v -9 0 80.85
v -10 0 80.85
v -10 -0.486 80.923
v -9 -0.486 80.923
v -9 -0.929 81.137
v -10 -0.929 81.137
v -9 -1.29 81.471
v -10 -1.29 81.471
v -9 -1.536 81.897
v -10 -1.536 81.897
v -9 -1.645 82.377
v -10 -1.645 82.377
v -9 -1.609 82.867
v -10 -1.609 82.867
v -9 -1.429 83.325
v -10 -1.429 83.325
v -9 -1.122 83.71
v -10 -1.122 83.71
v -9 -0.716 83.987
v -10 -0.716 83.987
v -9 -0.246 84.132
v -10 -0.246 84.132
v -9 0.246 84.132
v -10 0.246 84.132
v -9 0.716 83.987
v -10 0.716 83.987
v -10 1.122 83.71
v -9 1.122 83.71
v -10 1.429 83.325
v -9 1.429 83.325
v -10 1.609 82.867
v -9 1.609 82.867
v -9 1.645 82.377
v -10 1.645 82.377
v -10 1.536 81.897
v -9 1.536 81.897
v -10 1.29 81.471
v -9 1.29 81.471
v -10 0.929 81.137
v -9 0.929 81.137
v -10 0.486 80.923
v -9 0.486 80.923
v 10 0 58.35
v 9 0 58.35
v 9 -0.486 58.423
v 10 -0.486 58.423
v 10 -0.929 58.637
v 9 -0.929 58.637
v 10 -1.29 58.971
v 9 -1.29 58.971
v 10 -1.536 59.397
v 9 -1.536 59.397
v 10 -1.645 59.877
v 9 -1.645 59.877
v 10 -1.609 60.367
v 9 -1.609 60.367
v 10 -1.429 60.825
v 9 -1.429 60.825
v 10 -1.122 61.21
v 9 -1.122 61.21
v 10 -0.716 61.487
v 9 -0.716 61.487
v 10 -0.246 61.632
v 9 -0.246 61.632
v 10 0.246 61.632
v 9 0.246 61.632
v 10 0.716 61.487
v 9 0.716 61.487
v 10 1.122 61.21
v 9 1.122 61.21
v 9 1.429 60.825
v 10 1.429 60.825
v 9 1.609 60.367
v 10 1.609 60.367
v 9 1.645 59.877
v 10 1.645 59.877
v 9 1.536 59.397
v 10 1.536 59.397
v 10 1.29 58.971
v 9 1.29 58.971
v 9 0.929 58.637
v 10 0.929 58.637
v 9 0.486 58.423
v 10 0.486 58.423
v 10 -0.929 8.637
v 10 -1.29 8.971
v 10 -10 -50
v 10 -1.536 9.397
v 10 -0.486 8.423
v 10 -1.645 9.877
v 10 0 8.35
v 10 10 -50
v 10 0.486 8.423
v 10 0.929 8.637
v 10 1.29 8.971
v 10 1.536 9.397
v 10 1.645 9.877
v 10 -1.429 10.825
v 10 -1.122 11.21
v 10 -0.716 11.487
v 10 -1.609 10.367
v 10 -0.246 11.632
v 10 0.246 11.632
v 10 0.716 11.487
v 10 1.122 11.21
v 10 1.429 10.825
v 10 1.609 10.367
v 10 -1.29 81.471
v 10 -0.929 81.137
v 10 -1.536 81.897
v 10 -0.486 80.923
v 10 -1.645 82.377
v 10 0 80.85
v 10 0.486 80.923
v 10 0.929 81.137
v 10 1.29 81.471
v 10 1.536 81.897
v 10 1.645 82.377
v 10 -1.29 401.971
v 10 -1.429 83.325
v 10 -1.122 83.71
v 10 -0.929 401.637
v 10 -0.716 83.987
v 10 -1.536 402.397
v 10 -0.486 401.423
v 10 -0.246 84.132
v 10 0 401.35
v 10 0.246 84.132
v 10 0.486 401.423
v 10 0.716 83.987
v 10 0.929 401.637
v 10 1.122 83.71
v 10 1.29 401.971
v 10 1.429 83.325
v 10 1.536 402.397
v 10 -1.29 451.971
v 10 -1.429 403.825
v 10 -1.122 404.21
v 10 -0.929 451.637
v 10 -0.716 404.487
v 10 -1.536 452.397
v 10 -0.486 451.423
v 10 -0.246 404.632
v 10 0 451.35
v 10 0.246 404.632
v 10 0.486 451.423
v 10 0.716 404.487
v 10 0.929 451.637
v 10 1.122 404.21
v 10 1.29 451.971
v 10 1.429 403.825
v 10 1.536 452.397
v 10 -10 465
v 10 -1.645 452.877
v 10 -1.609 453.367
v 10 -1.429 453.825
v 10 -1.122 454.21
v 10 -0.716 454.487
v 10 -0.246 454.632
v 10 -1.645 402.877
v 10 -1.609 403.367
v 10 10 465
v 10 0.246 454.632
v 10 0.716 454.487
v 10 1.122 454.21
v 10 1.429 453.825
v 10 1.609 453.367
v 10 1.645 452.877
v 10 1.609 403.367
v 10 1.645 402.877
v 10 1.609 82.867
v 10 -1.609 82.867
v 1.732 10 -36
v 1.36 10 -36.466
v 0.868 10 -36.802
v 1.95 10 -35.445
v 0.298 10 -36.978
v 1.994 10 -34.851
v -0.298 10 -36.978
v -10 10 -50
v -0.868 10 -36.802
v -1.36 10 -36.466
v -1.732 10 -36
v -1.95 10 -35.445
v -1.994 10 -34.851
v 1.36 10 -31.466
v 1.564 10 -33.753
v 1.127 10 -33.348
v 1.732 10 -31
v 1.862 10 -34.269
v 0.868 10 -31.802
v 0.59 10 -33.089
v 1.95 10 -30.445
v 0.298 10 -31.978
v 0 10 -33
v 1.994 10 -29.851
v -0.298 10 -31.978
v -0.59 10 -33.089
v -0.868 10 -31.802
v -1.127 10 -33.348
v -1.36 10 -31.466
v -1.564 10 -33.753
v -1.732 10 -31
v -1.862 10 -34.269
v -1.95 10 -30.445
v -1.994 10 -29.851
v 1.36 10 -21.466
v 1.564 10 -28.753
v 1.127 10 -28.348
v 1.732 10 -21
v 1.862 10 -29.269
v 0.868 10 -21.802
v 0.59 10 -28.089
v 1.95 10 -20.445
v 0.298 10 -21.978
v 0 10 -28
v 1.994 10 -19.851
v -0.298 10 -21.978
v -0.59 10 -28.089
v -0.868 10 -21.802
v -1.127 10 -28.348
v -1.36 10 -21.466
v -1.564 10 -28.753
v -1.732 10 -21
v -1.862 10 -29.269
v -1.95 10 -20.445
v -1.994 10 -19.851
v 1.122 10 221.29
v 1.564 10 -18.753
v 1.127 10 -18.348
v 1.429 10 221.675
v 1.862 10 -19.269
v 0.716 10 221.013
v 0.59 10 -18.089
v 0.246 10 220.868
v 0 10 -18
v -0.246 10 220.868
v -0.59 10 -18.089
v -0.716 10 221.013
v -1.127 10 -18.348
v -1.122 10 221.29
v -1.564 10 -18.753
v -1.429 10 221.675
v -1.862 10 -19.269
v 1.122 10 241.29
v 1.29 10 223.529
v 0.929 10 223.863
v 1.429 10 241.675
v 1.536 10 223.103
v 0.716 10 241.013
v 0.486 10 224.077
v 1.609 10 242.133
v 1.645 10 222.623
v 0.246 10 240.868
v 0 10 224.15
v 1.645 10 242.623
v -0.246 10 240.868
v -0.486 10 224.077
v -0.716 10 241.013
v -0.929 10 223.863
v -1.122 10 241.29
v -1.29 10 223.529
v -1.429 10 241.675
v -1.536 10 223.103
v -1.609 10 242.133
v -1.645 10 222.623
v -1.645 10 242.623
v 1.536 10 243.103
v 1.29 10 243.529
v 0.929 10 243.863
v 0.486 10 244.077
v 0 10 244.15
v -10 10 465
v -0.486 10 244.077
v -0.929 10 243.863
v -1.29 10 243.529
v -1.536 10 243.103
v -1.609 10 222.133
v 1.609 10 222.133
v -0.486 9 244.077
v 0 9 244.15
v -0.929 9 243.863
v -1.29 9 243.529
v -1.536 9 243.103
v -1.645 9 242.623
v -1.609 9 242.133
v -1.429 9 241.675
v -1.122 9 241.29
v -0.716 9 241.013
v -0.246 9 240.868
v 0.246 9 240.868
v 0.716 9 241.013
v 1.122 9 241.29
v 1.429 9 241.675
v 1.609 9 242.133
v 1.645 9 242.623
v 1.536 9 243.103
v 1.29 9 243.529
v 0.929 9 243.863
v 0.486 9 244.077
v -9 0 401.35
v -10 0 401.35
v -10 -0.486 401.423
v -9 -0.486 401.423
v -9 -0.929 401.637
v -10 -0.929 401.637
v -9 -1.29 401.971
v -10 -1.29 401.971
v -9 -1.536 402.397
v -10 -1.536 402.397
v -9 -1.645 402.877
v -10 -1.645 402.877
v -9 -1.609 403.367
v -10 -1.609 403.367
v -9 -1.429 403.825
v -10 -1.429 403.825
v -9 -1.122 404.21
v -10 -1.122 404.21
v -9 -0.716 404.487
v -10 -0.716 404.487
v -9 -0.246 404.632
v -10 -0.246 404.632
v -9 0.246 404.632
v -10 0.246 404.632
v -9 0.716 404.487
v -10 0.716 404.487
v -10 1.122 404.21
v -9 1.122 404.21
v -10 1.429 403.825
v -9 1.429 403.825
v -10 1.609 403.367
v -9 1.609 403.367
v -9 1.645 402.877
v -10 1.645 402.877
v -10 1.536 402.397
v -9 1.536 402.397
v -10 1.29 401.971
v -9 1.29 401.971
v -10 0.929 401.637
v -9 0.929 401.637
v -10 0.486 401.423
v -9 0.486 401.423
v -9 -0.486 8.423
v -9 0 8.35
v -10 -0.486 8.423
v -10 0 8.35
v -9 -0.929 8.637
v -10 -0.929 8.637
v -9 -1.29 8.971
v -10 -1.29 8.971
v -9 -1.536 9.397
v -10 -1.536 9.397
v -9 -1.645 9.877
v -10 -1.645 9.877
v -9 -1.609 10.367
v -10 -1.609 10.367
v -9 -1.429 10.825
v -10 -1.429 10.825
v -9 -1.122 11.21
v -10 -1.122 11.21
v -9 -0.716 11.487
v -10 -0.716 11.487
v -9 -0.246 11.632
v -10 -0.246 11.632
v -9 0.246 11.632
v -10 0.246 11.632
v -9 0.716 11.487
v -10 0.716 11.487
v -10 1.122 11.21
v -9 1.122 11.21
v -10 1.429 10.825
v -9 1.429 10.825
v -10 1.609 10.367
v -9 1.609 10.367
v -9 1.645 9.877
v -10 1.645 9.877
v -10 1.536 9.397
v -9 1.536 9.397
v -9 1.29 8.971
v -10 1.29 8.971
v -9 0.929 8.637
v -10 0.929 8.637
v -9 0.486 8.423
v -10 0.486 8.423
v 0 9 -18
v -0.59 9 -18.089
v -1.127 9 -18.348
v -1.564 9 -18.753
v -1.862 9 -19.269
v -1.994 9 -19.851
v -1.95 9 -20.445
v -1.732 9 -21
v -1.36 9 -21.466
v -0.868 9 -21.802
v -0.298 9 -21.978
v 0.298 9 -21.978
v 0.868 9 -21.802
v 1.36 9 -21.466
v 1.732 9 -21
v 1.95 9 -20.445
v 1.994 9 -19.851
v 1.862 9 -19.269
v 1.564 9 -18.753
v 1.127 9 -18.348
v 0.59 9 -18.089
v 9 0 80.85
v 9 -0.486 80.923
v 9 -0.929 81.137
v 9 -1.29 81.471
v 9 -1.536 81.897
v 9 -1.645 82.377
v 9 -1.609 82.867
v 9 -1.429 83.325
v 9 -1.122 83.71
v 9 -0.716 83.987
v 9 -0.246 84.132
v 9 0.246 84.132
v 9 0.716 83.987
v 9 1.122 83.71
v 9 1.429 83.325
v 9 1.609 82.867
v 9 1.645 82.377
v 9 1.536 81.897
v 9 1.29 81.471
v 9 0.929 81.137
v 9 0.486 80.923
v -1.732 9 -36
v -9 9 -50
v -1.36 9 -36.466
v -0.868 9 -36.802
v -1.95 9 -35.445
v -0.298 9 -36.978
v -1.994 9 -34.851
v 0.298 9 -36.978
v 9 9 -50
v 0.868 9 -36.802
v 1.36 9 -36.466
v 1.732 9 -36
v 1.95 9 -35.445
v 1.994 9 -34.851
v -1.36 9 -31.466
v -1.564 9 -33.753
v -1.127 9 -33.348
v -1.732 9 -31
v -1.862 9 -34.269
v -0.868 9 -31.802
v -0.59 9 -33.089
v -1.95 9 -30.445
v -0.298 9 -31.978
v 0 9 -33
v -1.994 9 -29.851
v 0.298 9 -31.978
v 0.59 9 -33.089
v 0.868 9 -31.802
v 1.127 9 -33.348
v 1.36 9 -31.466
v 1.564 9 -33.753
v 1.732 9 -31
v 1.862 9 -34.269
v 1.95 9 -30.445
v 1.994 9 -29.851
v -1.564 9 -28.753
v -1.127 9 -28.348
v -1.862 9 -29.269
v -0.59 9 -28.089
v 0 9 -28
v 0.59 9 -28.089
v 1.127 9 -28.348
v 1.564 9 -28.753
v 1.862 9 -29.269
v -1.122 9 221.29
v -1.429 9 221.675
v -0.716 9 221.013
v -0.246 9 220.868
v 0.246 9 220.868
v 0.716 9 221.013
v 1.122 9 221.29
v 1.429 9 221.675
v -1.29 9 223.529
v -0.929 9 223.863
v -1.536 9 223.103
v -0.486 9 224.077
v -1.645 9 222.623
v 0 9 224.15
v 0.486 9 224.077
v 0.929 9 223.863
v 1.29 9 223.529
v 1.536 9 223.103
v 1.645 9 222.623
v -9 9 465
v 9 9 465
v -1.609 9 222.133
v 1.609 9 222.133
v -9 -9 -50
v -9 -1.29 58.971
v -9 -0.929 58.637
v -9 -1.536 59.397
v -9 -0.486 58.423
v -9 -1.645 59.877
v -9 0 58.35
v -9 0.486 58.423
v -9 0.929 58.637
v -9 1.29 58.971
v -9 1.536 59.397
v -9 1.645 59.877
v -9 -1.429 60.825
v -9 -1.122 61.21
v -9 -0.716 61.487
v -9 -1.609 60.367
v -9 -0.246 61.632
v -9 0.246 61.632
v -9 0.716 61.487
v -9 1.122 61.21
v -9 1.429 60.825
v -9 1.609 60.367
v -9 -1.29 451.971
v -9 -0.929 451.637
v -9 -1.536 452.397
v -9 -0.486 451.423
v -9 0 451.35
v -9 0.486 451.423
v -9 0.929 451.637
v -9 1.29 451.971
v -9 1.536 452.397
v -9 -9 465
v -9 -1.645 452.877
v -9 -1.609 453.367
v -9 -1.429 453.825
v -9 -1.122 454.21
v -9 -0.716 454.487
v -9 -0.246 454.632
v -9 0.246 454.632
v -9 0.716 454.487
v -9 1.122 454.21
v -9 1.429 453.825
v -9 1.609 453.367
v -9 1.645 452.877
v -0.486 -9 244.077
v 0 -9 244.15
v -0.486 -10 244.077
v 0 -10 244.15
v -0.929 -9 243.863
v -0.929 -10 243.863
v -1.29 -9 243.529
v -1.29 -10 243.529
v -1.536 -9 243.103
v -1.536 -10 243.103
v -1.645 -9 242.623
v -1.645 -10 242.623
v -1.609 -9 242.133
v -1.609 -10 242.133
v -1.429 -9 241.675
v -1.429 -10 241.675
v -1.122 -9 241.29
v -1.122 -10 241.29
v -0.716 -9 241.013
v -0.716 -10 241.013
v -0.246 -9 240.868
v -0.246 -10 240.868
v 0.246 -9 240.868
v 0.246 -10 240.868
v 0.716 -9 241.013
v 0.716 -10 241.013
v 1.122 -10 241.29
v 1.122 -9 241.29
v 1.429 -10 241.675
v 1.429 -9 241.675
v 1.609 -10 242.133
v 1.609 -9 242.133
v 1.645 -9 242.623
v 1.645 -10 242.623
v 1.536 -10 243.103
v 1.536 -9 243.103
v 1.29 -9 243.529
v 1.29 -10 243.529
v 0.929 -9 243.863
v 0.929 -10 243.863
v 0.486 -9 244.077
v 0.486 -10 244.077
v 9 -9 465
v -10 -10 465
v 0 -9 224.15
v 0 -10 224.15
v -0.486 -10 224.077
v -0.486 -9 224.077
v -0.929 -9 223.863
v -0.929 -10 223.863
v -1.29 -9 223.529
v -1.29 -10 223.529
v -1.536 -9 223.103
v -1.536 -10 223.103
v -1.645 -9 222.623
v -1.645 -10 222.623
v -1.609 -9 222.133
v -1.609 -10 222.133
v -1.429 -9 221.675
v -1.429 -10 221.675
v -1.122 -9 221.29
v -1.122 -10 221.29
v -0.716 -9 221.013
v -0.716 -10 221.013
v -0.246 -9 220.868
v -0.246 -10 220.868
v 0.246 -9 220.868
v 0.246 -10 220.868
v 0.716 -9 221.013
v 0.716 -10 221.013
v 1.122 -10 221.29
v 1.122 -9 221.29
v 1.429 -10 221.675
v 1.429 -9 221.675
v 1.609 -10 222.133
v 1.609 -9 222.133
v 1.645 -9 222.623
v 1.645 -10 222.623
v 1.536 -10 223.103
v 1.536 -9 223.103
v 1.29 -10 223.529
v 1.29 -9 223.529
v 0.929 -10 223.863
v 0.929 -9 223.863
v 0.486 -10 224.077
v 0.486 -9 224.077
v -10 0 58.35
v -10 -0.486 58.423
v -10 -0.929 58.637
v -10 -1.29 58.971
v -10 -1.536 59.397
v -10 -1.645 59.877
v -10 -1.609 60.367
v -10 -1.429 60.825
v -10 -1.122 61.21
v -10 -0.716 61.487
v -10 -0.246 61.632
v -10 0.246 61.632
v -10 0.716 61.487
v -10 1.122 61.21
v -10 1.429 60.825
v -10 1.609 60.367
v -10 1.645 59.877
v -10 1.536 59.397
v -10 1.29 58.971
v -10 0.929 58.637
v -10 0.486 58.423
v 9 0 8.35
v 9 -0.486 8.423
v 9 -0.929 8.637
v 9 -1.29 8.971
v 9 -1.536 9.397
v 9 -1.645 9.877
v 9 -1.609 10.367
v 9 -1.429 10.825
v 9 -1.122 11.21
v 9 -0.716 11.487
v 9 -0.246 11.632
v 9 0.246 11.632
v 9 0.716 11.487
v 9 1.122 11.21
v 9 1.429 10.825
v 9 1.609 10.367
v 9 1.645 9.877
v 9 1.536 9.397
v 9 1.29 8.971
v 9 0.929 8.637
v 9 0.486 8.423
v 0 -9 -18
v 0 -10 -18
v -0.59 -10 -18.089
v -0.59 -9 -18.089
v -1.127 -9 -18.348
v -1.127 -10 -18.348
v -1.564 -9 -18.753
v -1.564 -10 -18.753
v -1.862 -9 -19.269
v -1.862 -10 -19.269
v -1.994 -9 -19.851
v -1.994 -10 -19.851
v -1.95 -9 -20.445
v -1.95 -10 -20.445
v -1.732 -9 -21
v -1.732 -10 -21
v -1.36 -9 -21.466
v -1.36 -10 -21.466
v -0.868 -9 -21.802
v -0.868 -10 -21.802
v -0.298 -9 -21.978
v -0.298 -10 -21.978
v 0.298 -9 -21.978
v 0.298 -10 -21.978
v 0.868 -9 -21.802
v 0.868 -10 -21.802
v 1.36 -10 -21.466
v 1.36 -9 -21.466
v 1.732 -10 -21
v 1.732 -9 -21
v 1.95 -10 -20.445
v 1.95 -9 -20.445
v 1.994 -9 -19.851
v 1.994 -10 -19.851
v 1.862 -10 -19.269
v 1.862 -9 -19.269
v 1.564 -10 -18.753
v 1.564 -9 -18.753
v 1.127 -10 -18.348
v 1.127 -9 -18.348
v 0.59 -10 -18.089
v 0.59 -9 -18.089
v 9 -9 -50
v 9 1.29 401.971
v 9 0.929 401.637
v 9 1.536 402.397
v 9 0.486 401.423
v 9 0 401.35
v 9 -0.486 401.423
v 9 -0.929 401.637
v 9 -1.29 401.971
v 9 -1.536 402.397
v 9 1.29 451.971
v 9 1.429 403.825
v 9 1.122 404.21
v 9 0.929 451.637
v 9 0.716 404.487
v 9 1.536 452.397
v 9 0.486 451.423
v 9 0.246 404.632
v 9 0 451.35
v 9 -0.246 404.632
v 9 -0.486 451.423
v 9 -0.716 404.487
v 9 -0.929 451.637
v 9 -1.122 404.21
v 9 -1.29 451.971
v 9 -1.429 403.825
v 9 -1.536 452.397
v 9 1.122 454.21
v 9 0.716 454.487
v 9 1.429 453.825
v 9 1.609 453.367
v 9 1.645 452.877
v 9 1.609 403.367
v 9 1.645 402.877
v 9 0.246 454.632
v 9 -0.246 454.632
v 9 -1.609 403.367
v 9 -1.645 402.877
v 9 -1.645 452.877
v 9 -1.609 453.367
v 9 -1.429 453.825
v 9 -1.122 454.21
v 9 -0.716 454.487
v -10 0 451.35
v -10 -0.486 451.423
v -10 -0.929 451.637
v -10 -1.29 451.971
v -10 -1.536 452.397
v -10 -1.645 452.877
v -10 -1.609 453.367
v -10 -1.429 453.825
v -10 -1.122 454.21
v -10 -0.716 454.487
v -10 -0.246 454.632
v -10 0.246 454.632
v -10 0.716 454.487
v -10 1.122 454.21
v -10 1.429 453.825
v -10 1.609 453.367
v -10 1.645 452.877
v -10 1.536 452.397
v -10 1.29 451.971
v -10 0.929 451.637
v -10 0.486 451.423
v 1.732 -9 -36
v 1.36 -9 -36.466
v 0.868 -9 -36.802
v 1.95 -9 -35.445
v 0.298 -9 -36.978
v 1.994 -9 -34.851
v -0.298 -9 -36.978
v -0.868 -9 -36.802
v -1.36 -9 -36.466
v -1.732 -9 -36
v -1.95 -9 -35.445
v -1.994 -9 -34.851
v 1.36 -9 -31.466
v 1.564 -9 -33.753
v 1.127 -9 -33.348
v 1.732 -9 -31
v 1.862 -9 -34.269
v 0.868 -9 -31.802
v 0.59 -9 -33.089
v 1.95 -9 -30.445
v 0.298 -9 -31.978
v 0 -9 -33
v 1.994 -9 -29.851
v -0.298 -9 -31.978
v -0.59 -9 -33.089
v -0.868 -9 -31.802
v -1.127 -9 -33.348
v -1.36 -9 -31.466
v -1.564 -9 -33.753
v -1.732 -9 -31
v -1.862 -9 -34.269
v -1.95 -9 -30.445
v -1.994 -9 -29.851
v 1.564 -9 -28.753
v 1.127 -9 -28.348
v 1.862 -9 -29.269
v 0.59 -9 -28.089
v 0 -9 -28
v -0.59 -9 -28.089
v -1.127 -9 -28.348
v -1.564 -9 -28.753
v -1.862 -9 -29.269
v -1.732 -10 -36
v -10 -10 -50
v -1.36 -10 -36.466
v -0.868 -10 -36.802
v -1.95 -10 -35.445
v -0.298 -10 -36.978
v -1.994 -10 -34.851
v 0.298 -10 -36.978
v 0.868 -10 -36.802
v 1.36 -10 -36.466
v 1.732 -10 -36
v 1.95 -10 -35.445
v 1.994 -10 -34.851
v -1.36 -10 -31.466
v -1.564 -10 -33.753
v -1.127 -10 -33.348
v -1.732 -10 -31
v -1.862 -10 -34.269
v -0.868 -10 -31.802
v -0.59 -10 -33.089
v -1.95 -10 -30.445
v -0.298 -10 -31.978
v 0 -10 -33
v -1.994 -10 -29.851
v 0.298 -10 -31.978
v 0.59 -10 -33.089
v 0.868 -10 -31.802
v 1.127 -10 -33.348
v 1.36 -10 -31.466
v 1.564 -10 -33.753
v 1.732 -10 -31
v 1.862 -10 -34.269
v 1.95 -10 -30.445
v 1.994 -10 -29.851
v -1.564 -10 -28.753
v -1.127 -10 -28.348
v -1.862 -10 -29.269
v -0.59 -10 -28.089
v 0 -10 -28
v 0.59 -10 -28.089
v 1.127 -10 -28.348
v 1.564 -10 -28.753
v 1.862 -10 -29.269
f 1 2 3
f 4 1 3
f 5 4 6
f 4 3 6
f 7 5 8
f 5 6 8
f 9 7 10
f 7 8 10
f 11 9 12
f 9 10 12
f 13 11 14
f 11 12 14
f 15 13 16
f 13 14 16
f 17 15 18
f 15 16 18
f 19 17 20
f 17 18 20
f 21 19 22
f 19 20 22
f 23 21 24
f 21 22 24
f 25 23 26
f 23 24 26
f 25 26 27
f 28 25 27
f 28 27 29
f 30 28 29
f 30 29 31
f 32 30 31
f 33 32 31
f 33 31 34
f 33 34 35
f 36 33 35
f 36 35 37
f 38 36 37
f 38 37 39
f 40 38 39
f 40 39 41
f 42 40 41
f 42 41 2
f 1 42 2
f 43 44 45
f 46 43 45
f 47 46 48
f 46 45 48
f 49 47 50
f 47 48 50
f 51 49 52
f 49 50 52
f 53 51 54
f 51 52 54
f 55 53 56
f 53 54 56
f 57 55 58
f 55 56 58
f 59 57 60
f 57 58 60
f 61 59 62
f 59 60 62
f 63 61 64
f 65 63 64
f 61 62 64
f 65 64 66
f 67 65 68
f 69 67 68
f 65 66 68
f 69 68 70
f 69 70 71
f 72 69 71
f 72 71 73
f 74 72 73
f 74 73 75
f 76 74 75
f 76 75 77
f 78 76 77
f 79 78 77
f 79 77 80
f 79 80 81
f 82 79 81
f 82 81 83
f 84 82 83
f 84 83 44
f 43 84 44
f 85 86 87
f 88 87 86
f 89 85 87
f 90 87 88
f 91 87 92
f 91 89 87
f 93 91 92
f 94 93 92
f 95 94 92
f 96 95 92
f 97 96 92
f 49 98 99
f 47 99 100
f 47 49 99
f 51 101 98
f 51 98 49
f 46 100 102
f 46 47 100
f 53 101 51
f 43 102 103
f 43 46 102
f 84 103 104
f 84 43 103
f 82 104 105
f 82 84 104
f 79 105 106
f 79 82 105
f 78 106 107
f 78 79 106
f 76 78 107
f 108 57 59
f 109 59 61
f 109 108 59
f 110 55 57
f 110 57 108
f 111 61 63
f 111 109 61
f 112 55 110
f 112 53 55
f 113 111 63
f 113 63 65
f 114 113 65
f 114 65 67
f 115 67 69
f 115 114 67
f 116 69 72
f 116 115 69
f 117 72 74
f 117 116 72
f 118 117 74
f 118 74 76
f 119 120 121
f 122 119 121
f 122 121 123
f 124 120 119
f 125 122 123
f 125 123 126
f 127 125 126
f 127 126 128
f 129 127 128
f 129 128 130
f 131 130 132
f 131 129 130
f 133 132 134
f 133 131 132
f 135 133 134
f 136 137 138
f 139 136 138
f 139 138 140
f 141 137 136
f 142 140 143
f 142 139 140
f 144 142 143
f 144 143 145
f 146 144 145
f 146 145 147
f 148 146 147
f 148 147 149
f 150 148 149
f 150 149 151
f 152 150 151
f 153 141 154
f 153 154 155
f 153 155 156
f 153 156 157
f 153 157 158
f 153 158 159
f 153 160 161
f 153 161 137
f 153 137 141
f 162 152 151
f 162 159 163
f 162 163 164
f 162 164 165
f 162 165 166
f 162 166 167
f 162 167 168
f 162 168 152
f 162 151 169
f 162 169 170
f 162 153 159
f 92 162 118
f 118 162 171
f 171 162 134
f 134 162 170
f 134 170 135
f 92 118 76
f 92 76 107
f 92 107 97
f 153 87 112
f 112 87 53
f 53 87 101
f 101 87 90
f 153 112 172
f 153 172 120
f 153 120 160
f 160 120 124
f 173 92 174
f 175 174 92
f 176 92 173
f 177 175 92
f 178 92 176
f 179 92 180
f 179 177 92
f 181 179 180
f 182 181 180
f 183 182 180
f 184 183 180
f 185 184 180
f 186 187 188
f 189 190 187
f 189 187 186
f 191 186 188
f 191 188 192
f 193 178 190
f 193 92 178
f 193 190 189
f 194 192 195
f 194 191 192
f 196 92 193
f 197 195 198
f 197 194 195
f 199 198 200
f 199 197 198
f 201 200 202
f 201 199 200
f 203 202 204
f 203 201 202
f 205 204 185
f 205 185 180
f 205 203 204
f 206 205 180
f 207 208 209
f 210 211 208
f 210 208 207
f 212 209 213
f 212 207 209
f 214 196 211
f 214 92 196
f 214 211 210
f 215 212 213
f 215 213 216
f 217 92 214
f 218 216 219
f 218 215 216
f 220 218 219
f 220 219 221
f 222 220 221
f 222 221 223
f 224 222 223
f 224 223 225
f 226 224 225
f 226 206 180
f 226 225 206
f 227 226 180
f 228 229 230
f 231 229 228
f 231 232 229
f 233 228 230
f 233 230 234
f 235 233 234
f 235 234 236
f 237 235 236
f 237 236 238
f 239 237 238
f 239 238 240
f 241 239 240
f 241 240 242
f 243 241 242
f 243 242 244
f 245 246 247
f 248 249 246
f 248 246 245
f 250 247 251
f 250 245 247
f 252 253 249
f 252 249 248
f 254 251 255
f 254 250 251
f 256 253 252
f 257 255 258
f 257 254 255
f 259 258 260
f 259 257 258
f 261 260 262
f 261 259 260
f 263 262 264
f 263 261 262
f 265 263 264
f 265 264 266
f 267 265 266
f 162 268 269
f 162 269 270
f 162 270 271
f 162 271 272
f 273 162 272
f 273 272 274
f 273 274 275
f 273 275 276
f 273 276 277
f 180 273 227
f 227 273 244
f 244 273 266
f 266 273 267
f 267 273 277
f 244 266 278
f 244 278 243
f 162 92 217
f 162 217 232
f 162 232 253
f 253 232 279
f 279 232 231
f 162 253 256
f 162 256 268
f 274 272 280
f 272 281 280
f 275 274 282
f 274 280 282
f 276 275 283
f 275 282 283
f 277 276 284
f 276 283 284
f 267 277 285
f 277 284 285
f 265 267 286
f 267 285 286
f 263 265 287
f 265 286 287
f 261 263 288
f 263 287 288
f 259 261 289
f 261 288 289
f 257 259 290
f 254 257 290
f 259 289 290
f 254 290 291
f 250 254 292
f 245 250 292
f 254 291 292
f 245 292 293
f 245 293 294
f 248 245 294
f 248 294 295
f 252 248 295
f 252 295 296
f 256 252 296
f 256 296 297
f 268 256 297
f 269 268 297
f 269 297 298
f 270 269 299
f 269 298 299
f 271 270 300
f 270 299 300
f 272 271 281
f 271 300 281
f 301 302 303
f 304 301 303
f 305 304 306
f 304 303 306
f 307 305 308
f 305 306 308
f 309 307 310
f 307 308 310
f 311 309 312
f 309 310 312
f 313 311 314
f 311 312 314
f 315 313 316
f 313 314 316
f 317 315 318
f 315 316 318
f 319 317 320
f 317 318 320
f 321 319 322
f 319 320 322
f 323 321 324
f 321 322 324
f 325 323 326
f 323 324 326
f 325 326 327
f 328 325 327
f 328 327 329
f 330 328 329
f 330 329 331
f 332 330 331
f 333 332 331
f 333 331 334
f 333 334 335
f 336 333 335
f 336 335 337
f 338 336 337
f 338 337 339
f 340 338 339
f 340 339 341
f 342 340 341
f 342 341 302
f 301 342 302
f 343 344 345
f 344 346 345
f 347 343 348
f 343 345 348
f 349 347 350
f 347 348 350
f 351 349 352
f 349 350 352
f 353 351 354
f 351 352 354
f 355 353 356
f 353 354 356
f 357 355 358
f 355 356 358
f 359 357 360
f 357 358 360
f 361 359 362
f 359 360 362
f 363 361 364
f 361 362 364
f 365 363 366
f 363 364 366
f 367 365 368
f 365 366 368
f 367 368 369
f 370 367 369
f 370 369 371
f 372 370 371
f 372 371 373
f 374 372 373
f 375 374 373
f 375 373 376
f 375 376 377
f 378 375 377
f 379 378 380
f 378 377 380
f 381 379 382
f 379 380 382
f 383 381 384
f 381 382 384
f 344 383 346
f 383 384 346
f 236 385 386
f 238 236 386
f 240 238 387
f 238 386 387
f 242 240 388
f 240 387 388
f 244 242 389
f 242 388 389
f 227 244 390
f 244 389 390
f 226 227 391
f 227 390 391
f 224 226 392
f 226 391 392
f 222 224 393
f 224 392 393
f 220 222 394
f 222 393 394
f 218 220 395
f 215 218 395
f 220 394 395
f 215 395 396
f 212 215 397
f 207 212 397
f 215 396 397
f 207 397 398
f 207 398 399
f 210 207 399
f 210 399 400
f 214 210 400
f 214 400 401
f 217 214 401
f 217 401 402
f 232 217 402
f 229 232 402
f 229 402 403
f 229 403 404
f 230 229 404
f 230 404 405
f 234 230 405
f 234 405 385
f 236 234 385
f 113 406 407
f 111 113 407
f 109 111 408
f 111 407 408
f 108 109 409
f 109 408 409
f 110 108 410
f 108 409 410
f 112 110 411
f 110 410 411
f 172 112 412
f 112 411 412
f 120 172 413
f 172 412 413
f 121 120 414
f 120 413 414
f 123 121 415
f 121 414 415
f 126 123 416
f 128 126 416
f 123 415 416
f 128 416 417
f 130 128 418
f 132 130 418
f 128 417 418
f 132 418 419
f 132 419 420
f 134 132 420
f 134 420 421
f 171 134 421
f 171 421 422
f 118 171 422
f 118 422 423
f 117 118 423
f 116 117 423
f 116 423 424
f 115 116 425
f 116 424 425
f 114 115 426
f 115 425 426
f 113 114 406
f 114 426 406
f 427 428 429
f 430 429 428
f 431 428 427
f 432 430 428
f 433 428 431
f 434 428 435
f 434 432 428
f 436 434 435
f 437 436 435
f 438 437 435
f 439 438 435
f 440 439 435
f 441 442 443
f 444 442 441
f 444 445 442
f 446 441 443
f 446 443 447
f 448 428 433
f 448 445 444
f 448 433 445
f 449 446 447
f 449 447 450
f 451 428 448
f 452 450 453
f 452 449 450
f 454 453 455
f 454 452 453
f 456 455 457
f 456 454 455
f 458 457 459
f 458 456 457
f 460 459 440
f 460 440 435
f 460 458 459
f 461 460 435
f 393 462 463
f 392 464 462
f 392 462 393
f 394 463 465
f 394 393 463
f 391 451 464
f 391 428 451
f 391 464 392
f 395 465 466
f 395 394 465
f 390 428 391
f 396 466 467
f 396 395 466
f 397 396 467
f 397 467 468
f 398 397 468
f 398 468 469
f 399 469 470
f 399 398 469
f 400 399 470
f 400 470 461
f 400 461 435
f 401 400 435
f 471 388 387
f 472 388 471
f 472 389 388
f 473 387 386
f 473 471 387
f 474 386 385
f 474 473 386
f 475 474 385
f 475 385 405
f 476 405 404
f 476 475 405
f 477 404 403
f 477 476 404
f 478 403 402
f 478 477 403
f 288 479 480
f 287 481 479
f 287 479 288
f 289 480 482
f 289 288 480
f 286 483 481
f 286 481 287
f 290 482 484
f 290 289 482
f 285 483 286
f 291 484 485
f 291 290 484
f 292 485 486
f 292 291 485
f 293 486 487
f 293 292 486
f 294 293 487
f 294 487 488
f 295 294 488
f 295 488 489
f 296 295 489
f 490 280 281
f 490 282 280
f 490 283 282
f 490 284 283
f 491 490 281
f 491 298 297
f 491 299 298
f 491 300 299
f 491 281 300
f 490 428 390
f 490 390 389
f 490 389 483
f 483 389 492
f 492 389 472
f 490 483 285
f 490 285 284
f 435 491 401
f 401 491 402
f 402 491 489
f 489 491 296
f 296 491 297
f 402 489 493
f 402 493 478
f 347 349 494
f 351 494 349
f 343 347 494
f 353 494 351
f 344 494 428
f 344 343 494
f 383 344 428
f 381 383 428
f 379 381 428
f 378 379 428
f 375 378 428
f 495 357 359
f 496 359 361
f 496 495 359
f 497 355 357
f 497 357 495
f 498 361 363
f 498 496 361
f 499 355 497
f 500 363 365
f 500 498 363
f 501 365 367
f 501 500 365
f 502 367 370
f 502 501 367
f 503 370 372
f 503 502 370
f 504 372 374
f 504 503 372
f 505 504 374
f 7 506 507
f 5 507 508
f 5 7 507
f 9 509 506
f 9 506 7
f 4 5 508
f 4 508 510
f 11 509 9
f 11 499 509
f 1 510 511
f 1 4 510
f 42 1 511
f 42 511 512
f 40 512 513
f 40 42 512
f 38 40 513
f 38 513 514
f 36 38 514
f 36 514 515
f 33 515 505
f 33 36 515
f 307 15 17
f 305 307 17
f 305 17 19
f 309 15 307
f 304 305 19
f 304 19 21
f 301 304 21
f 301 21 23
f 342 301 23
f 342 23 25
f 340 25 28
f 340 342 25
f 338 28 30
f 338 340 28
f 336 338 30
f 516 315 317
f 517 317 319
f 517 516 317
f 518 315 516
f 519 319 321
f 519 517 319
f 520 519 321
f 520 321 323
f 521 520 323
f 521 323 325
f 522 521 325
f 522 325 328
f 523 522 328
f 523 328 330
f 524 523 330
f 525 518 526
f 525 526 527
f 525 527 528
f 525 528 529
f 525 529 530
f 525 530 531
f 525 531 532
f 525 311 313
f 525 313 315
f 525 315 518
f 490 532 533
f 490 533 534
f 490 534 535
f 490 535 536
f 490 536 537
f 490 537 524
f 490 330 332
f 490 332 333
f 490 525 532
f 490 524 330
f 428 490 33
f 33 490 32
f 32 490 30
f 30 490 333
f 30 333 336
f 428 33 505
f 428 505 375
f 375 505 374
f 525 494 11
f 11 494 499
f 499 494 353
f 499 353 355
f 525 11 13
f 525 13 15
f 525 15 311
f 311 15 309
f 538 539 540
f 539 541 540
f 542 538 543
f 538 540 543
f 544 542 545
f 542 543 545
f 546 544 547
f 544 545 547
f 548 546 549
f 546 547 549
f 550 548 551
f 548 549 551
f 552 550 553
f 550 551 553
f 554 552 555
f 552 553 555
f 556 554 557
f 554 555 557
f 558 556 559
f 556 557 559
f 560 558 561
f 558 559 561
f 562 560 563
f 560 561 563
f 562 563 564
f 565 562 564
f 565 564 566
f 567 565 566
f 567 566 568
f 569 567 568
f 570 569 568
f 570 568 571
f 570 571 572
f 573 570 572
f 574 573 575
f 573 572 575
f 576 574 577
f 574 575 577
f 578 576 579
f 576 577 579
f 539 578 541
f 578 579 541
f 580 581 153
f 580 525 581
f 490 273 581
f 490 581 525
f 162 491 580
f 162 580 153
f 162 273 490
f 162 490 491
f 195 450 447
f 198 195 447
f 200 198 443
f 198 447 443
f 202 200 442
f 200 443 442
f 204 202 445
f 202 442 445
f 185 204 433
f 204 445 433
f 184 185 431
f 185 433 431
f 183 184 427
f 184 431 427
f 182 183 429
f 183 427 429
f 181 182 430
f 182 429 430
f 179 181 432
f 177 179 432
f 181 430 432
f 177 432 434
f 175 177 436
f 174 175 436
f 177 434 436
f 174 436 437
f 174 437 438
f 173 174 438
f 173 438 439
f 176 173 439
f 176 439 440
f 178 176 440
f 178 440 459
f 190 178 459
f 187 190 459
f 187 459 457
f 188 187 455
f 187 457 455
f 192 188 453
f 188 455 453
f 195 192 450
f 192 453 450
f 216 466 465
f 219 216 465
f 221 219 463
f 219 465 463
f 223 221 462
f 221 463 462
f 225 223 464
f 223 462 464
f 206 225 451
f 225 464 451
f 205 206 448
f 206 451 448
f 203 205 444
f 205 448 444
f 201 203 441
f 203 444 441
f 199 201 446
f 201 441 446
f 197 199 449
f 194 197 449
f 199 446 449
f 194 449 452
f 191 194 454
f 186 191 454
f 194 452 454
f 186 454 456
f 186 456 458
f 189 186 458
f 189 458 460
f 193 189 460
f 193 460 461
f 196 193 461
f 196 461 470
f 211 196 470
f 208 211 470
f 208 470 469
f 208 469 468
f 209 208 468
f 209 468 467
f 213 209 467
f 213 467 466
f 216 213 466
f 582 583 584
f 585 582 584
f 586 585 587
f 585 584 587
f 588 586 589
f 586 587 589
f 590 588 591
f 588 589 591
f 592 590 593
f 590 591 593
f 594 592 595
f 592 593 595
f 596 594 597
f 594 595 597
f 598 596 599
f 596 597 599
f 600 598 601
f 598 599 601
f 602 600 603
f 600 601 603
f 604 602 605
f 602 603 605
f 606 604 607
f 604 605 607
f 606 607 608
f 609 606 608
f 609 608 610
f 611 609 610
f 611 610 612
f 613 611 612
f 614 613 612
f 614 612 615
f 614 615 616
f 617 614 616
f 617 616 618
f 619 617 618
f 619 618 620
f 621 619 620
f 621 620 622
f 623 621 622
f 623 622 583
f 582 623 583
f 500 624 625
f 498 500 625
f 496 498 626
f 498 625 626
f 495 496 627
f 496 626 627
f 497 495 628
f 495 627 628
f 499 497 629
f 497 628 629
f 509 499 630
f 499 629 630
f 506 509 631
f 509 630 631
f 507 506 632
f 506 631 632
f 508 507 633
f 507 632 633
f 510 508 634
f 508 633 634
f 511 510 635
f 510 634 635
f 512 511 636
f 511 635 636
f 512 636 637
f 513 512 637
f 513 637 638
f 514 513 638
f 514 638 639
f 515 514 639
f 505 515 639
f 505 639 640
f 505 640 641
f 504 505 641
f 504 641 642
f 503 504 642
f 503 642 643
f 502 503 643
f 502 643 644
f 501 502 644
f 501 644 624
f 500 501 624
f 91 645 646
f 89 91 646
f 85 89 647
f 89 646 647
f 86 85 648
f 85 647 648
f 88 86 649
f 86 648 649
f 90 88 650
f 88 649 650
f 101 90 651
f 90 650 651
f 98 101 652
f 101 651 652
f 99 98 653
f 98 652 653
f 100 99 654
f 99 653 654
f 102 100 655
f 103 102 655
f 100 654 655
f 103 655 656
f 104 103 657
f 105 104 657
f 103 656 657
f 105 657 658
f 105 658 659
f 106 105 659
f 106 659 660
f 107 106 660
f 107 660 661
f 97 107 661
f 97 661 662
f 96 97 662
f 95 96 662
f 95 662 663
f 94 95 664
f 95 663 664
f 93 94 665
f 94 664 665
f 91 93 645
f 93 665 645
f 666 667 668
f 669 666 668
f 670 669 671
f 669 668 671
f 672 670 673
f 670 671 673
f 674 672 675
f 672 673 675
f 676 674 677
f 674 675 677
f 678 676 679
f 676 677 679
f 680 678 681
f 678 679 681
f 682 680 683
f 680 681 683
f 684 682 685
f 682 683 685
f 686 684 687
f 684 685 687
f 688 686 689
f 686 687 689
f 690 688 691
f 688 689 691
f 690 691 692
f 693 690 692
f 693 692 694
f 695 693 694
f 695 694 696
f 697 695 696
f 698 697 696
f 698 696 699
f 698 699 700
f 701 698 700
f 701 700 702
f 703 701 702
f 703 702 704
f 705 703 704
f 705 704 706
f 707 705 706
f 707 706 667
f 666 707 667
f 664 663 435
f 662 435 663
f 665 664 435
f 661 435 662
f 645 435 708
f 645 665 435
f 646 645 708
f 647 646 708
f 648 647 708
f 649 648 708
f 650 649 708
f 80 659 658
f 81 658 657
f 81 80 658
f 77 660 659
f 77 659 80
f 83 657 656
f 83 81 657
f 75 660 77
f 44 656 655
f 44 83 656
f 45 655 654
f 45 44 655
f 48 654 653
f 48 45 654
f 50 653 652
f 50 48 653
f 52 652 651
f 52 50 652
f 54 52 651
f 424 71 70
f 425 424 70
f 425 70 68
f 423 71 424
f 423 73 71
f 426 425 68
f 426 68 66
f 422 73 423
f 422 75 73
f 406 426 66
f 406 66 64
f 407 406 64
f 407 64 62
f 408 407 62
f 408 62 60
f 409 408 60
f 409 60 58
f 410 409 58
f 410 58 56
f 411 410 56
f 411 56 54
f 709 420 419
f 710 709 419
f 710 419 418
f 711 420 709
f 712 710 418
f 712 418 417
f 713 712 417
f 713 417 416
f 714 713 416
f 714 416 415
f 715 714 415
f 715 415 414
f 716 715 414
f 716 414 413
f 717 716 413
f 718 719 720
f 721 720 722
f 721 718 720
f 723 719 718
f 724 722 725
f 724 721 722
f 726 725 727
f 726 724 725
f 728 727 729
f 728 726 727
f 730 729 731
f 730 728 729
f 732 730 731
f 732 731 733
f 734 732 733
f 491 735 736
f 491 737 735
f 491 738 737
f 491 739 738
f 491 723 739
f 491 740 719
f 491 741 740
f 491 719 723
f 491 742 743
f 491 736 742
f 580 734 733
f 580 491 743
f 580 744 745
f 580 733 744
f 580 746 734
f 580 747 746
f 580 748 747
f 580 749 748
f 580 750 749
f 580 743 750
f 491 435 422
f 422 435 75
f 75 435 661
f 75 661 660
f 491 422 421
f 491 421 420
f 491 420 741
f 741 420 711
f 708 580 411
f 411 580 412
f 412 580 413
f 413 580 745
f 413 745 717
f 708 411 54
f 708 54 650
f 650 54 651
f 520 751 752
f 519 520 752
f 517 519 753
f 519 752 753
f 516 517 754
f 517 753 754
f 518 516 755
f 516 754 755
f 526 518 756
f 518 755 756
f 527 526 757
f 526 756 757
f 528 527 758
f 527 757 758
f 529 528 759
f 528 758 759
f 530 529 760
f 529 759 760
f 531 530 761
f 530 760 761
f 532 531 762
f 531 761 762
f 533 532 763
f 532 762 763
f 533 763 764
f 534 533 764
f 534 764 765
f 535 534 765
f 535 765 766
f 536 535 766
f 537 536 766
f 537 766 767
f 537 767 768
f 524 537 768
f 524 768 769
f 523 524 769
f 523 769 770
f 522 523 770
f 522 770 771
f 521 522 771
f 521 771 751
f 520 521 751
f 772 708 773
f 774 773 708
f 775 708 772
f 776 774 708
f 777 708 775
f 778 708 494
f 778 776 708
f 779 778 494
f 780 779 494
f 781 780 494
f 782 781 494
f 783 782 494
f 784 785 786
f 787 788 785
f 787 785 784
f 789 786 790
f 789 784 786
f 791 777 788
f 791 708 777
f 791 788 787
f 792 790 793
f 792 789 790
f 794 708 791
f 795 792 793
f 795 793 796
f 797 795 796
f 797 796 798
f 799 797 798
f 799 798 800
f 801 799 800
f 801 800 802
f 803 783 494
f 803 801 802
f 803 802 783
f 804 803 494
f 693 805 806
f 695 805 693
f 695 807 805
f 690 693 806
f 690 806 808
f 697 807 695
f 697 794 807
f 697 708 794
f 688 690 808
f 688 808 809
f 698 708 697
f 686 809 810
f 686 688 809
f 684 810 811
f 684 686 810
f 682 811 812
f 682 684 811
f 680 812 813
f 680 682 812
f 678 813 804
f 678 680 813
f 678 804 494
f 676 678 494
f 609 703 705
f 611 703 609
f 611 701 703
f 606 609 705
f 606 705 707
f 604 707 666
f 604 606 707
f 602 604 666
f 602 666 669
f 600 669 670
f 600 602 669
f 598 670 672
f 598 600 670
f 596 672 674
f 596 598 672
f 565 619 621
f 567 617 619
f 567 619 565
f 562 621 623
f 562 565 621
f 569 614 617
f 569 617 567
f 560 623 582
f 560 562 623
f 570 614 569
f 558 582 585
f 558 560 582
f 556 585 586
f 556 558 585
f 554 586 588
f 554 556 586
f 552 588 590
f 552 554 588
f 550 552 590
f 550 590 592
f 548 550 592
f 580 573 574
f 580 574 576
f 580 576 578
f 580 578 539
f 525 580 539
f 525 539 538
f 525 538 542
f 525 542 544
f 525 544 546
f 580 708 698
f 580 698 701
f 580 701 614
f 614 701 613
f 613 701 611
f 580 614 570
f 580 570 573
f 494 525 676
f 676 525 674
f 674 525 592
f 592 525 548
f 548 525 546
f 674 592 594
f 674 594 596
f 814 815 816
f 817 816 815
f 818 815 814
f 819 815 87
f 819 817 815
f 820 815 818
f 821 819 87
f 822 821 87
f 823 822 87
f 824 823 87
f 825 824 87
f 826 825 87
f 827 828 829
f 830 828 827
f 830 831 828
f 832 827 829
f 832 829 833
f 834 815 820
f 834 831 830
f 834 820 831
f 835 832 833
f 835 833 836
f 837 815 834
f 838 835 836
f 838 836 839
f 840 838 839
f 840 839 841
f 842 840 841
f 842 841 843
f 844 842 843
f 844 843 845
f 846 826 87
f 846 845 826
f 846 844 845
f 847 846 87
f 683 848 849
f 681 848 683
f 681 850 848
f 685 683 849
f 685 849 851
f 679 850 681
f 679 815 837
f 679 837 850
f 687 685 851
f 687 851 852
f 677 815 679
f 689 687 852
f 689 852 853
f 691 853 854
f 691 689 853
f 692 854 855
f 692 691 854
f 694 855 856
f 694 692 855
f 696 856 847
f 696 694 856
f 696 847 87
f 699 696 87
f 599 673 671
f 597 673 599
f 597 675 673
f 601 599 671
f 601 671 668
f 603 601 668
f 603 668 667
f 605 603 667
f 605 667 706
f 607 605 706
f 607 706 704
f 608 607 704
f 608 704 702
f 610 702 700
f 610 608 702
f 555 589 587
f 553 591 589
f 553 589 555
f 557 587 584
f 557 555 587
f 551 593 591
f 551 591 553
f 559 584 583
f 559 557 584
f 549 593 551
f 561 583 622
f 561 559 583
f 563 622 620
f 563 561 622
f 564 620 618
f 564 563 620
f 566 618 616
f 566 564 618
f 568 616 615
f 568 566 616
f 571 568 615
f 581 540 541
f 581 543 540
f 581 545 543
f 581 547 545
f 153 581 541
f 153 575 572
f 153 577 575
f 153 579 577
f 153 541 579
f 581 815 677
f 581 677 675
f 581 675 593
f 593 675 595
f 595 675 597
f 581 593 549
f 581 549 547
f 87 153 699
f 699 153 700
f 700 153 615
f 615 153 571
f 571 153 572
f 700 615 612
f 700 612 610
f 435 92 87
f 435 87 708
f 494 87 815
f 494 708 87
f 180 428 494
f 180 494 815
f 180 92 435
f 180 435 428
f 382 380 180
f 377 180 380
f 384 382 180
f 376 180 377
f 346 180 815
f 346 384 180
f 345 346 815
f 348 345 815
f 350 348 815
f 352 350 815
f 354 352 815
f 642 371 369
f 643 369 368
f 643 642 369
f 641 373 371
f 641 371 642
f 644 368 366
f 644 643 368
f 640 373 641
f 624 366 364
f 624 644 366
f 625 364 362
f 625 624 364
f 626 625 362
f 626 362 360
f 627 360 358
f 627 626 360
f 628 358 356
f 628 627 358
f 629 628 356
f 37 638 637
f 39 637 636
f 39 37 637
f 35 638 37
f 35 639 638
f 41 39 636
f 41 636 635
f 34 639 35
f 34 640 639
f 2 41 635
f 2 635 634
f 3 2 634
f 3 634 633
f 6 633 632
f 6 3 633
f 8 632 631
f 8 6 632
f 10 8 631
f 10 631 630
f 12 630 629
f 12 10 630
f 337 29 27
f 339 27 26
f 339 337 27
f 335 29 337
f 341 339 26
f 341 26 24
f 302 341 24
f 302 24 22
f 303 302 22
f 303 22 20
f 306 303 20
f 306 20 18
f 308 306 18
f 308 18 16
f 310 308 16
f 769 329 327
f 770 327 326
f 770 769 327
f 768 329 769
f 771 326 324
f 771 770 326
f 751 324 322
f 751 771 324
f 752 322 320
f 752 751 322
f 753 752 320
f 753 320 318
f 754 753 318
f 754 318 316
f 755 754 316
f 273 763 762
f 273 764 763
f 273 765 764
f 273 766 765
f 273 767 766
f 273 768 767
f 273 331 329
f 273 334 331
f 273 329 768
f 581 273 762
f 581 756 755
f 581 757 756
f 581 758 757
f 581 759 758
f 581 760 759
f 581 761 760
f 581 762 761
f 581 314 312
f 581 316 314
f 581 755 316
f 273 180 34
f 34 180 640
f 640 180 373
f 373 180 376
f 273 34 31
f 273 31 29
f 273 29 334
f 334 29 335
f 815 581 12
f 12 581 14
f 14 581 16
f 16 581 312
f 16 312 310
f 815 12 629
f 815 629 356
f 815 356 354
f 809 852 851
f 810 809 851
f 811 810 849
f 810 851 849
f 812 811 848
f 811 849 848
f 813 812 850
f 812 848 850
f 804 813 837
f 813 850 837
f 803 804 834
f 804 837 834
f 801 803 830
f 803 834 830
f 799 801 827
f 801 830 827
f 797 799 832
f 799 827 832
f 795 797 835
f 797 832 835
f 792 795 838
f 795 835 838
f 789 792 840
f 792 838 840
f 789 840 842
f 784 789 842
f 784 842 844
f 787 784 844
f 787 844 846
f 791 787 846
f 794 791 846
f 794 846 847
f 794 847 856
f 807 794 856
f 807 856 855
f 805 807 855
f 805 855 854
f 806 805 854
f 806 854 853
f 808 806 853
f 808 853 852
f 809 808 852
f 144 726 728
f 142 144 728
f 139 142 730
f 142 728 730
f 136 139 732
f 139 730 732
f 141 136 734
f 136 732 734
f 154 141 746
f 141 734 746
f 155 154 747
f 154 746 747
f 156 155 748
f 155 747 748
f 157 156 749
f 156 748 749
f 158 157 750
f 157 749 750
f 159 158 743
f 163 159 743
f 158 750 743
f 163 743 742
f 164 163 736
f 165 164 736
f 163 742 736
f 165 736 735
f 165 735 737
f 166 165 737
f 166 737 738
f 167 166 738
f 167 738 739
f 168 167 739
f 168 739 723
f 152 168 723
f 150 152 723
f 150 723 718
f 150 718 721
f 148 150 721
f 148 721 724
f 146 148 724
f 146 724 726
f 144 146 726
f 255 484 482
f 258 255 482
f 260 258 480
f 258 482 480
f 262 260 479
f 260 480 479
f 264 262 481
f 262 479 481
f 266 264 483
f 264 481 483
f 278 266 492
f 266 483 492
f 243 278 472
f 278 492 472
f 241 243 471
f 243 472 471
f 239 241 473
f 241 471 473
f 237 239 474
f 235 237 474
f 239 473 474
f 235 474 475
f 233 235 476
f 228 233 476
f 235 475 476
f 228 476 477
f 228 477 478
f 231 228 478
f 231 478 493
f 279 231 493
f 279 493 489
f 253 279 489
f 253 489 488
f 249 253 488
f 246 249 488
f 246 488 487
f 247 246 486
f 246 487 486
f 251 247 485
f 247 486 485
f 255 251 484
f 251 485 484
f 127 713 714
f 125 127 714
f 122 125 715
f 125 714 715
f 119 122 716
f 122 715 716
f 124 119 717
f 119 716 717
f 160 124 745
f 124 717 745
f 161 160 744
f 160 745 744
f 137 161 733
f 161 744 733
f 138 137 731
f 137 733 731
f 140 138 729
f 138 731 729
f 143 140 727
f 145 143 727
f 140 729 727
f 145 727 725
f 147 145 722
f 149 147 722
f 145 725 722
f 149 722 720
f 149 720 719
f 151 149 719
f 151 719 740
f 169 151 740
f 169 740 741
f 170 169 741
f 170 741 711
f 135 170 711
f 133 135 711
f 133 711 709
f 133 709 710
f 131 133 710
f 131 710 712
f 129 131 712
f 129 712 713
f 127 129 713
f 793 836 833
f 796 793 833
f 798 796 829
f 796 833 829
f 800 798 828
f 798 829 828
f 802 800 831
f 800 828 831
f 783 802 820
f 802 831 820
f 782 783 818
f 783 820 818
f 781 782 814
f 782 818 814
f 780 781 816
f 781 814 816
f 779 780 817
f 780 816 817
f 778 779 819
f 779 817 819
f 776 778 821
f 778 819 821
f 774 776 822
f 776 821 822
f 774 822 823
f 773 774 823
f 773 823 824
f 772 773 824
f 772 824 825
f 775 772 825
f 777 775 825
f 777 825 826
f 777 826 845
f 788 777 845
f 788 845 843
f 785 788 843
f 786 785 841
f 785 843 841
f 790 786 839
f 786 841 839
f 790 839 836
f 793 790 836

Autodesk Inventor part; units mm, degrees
ref_plane "YZ Plane" through (0, 0, 0) normal (1, 0, 0) x (0, 1, 0)
ref_plane "XZ Plane" through (0, 0, 0) normal (0, 1, 0) x (-1, 0, 0)
ref_plane "XY Plane" through (0, 0, 0) normal (0, 0, 1) x (1, 0, 0)
sketch "スケッチ1" plane through (0, 0, 0) normal (0, 0, 1) x (1, 0, 0)
  line L0 (10, -10) -> (-10, -10)
  line L1 (-10, -10) -> (-10, 10)
  line L2 (-10, 10) -> (10, 10)
  line L3 (10, 10) -> (10, -10)
  line L4 (10, -10) -> (-10, 10) construction
  line L5 (-10, -10) -> (10, 10) construction
  line L6 (9, 9) -> (-9, 9)
  line L7 (-9, 9) -> (-9, -9)
  line L8 (-9, -9) -> (9, -9)
  line L9 (9, -9) -> (9, 9)
  point P0 (0, 0)
  dimension "d0" = 20
  dimension "d1" = 20
  dimension "d2" = 1
extrude "押し出し1" add sketch "スケッチ1" along normal blind 465
sketch "スケッチ2" plane through (10, -10, 0) normal (1, 0, 0) x (0, 0, -1)
  line L0 (0, 10) -> (-465, 10)
  line L1 (-465, 0) -> (-465, 20) projected
  line L2 (0, 0) -> (0, 20) projected
  point P0 (-403, 10)
  point P1 (-60, 10)
  point P2 (-10, 10)
  point P3 (-453, 10)
  point P4 (-82.5, 10)
  point P5 (-232.5, 10)
  dimension "d5" = 343
  dimension "d6" = 50
  dimension "d7" = 10
  dimension "d15" = 50
  dimension "d17" = 465
  dimension "d28" = 150
hole "穴1" at (10, 0, 403) at (10, 0, 60) at (10, 0, 10) at (10, 0, 453) at (10, 0, 82.5) direction (-1, 0, 0) diameter 3.3 end through all
sketch "スケッチ3" plane through (-10, 10, 0) normal (0, 1, 0) x (1, 0, 0)
  line L0 (10, 0) -> (10, -465)
  line L1 (20, -465) -> (0, -465) projected
  point P0 (10, -242.5)
  point P1 (10, -222.5)
  point P2 (10, -232.5)
  dimension "d19" = 20
  dimension "d20" = 10
hole "穴2" at (0, 10, 242.5) at (0, 10, 222.5) direction (0, -1, 0) diameter 3.3 end through all
sketch "スケッチ6" plane through (0, 0, 0) normal (0, 0, -1) x (-1, 0, 0)
  line L0 (-10, 10) -> (10, 10) projected
  line L1 (-10, -10) -> (-10, 10) projected
  line L2 (10, -10) -> (-10, -10) projected
  line L3 (10, 10) -> (10, -10) projected
  line L4 (-9, 9) -> (-9, -9) projected
  line L5 (9, 9) -> (-9, 9) projected
  line L6 (9, -9) -> (9, 9) projected
  line L7 (-9, -9) -> (9, -9) projected
  point P0 (0, 0)
extrude "押し出し4" add sketch "スケッチ6" along normal blind 50
sketch "スケッチ7" plane through (-10, 10, 465) normal (0, 1, 0) x (1, 0, 0)
  line L0 (10, 465) -> (10, 515)
  line L1 (1, 515) -> (19, 515) projected
  point P0 (10, 500)
  point P1 (10, 485)
  point P2 (10, 495)
  dimension "d44" = 35
  dimension "d52" = 10
  dimension "d53" = 5
hole "穴3" at (0, 10, -30) at (0, 10, -20) at (0, 10, -35) direction (0, -1, 0) diameter 4 end through all
properties part number "kaku_2020_465"
